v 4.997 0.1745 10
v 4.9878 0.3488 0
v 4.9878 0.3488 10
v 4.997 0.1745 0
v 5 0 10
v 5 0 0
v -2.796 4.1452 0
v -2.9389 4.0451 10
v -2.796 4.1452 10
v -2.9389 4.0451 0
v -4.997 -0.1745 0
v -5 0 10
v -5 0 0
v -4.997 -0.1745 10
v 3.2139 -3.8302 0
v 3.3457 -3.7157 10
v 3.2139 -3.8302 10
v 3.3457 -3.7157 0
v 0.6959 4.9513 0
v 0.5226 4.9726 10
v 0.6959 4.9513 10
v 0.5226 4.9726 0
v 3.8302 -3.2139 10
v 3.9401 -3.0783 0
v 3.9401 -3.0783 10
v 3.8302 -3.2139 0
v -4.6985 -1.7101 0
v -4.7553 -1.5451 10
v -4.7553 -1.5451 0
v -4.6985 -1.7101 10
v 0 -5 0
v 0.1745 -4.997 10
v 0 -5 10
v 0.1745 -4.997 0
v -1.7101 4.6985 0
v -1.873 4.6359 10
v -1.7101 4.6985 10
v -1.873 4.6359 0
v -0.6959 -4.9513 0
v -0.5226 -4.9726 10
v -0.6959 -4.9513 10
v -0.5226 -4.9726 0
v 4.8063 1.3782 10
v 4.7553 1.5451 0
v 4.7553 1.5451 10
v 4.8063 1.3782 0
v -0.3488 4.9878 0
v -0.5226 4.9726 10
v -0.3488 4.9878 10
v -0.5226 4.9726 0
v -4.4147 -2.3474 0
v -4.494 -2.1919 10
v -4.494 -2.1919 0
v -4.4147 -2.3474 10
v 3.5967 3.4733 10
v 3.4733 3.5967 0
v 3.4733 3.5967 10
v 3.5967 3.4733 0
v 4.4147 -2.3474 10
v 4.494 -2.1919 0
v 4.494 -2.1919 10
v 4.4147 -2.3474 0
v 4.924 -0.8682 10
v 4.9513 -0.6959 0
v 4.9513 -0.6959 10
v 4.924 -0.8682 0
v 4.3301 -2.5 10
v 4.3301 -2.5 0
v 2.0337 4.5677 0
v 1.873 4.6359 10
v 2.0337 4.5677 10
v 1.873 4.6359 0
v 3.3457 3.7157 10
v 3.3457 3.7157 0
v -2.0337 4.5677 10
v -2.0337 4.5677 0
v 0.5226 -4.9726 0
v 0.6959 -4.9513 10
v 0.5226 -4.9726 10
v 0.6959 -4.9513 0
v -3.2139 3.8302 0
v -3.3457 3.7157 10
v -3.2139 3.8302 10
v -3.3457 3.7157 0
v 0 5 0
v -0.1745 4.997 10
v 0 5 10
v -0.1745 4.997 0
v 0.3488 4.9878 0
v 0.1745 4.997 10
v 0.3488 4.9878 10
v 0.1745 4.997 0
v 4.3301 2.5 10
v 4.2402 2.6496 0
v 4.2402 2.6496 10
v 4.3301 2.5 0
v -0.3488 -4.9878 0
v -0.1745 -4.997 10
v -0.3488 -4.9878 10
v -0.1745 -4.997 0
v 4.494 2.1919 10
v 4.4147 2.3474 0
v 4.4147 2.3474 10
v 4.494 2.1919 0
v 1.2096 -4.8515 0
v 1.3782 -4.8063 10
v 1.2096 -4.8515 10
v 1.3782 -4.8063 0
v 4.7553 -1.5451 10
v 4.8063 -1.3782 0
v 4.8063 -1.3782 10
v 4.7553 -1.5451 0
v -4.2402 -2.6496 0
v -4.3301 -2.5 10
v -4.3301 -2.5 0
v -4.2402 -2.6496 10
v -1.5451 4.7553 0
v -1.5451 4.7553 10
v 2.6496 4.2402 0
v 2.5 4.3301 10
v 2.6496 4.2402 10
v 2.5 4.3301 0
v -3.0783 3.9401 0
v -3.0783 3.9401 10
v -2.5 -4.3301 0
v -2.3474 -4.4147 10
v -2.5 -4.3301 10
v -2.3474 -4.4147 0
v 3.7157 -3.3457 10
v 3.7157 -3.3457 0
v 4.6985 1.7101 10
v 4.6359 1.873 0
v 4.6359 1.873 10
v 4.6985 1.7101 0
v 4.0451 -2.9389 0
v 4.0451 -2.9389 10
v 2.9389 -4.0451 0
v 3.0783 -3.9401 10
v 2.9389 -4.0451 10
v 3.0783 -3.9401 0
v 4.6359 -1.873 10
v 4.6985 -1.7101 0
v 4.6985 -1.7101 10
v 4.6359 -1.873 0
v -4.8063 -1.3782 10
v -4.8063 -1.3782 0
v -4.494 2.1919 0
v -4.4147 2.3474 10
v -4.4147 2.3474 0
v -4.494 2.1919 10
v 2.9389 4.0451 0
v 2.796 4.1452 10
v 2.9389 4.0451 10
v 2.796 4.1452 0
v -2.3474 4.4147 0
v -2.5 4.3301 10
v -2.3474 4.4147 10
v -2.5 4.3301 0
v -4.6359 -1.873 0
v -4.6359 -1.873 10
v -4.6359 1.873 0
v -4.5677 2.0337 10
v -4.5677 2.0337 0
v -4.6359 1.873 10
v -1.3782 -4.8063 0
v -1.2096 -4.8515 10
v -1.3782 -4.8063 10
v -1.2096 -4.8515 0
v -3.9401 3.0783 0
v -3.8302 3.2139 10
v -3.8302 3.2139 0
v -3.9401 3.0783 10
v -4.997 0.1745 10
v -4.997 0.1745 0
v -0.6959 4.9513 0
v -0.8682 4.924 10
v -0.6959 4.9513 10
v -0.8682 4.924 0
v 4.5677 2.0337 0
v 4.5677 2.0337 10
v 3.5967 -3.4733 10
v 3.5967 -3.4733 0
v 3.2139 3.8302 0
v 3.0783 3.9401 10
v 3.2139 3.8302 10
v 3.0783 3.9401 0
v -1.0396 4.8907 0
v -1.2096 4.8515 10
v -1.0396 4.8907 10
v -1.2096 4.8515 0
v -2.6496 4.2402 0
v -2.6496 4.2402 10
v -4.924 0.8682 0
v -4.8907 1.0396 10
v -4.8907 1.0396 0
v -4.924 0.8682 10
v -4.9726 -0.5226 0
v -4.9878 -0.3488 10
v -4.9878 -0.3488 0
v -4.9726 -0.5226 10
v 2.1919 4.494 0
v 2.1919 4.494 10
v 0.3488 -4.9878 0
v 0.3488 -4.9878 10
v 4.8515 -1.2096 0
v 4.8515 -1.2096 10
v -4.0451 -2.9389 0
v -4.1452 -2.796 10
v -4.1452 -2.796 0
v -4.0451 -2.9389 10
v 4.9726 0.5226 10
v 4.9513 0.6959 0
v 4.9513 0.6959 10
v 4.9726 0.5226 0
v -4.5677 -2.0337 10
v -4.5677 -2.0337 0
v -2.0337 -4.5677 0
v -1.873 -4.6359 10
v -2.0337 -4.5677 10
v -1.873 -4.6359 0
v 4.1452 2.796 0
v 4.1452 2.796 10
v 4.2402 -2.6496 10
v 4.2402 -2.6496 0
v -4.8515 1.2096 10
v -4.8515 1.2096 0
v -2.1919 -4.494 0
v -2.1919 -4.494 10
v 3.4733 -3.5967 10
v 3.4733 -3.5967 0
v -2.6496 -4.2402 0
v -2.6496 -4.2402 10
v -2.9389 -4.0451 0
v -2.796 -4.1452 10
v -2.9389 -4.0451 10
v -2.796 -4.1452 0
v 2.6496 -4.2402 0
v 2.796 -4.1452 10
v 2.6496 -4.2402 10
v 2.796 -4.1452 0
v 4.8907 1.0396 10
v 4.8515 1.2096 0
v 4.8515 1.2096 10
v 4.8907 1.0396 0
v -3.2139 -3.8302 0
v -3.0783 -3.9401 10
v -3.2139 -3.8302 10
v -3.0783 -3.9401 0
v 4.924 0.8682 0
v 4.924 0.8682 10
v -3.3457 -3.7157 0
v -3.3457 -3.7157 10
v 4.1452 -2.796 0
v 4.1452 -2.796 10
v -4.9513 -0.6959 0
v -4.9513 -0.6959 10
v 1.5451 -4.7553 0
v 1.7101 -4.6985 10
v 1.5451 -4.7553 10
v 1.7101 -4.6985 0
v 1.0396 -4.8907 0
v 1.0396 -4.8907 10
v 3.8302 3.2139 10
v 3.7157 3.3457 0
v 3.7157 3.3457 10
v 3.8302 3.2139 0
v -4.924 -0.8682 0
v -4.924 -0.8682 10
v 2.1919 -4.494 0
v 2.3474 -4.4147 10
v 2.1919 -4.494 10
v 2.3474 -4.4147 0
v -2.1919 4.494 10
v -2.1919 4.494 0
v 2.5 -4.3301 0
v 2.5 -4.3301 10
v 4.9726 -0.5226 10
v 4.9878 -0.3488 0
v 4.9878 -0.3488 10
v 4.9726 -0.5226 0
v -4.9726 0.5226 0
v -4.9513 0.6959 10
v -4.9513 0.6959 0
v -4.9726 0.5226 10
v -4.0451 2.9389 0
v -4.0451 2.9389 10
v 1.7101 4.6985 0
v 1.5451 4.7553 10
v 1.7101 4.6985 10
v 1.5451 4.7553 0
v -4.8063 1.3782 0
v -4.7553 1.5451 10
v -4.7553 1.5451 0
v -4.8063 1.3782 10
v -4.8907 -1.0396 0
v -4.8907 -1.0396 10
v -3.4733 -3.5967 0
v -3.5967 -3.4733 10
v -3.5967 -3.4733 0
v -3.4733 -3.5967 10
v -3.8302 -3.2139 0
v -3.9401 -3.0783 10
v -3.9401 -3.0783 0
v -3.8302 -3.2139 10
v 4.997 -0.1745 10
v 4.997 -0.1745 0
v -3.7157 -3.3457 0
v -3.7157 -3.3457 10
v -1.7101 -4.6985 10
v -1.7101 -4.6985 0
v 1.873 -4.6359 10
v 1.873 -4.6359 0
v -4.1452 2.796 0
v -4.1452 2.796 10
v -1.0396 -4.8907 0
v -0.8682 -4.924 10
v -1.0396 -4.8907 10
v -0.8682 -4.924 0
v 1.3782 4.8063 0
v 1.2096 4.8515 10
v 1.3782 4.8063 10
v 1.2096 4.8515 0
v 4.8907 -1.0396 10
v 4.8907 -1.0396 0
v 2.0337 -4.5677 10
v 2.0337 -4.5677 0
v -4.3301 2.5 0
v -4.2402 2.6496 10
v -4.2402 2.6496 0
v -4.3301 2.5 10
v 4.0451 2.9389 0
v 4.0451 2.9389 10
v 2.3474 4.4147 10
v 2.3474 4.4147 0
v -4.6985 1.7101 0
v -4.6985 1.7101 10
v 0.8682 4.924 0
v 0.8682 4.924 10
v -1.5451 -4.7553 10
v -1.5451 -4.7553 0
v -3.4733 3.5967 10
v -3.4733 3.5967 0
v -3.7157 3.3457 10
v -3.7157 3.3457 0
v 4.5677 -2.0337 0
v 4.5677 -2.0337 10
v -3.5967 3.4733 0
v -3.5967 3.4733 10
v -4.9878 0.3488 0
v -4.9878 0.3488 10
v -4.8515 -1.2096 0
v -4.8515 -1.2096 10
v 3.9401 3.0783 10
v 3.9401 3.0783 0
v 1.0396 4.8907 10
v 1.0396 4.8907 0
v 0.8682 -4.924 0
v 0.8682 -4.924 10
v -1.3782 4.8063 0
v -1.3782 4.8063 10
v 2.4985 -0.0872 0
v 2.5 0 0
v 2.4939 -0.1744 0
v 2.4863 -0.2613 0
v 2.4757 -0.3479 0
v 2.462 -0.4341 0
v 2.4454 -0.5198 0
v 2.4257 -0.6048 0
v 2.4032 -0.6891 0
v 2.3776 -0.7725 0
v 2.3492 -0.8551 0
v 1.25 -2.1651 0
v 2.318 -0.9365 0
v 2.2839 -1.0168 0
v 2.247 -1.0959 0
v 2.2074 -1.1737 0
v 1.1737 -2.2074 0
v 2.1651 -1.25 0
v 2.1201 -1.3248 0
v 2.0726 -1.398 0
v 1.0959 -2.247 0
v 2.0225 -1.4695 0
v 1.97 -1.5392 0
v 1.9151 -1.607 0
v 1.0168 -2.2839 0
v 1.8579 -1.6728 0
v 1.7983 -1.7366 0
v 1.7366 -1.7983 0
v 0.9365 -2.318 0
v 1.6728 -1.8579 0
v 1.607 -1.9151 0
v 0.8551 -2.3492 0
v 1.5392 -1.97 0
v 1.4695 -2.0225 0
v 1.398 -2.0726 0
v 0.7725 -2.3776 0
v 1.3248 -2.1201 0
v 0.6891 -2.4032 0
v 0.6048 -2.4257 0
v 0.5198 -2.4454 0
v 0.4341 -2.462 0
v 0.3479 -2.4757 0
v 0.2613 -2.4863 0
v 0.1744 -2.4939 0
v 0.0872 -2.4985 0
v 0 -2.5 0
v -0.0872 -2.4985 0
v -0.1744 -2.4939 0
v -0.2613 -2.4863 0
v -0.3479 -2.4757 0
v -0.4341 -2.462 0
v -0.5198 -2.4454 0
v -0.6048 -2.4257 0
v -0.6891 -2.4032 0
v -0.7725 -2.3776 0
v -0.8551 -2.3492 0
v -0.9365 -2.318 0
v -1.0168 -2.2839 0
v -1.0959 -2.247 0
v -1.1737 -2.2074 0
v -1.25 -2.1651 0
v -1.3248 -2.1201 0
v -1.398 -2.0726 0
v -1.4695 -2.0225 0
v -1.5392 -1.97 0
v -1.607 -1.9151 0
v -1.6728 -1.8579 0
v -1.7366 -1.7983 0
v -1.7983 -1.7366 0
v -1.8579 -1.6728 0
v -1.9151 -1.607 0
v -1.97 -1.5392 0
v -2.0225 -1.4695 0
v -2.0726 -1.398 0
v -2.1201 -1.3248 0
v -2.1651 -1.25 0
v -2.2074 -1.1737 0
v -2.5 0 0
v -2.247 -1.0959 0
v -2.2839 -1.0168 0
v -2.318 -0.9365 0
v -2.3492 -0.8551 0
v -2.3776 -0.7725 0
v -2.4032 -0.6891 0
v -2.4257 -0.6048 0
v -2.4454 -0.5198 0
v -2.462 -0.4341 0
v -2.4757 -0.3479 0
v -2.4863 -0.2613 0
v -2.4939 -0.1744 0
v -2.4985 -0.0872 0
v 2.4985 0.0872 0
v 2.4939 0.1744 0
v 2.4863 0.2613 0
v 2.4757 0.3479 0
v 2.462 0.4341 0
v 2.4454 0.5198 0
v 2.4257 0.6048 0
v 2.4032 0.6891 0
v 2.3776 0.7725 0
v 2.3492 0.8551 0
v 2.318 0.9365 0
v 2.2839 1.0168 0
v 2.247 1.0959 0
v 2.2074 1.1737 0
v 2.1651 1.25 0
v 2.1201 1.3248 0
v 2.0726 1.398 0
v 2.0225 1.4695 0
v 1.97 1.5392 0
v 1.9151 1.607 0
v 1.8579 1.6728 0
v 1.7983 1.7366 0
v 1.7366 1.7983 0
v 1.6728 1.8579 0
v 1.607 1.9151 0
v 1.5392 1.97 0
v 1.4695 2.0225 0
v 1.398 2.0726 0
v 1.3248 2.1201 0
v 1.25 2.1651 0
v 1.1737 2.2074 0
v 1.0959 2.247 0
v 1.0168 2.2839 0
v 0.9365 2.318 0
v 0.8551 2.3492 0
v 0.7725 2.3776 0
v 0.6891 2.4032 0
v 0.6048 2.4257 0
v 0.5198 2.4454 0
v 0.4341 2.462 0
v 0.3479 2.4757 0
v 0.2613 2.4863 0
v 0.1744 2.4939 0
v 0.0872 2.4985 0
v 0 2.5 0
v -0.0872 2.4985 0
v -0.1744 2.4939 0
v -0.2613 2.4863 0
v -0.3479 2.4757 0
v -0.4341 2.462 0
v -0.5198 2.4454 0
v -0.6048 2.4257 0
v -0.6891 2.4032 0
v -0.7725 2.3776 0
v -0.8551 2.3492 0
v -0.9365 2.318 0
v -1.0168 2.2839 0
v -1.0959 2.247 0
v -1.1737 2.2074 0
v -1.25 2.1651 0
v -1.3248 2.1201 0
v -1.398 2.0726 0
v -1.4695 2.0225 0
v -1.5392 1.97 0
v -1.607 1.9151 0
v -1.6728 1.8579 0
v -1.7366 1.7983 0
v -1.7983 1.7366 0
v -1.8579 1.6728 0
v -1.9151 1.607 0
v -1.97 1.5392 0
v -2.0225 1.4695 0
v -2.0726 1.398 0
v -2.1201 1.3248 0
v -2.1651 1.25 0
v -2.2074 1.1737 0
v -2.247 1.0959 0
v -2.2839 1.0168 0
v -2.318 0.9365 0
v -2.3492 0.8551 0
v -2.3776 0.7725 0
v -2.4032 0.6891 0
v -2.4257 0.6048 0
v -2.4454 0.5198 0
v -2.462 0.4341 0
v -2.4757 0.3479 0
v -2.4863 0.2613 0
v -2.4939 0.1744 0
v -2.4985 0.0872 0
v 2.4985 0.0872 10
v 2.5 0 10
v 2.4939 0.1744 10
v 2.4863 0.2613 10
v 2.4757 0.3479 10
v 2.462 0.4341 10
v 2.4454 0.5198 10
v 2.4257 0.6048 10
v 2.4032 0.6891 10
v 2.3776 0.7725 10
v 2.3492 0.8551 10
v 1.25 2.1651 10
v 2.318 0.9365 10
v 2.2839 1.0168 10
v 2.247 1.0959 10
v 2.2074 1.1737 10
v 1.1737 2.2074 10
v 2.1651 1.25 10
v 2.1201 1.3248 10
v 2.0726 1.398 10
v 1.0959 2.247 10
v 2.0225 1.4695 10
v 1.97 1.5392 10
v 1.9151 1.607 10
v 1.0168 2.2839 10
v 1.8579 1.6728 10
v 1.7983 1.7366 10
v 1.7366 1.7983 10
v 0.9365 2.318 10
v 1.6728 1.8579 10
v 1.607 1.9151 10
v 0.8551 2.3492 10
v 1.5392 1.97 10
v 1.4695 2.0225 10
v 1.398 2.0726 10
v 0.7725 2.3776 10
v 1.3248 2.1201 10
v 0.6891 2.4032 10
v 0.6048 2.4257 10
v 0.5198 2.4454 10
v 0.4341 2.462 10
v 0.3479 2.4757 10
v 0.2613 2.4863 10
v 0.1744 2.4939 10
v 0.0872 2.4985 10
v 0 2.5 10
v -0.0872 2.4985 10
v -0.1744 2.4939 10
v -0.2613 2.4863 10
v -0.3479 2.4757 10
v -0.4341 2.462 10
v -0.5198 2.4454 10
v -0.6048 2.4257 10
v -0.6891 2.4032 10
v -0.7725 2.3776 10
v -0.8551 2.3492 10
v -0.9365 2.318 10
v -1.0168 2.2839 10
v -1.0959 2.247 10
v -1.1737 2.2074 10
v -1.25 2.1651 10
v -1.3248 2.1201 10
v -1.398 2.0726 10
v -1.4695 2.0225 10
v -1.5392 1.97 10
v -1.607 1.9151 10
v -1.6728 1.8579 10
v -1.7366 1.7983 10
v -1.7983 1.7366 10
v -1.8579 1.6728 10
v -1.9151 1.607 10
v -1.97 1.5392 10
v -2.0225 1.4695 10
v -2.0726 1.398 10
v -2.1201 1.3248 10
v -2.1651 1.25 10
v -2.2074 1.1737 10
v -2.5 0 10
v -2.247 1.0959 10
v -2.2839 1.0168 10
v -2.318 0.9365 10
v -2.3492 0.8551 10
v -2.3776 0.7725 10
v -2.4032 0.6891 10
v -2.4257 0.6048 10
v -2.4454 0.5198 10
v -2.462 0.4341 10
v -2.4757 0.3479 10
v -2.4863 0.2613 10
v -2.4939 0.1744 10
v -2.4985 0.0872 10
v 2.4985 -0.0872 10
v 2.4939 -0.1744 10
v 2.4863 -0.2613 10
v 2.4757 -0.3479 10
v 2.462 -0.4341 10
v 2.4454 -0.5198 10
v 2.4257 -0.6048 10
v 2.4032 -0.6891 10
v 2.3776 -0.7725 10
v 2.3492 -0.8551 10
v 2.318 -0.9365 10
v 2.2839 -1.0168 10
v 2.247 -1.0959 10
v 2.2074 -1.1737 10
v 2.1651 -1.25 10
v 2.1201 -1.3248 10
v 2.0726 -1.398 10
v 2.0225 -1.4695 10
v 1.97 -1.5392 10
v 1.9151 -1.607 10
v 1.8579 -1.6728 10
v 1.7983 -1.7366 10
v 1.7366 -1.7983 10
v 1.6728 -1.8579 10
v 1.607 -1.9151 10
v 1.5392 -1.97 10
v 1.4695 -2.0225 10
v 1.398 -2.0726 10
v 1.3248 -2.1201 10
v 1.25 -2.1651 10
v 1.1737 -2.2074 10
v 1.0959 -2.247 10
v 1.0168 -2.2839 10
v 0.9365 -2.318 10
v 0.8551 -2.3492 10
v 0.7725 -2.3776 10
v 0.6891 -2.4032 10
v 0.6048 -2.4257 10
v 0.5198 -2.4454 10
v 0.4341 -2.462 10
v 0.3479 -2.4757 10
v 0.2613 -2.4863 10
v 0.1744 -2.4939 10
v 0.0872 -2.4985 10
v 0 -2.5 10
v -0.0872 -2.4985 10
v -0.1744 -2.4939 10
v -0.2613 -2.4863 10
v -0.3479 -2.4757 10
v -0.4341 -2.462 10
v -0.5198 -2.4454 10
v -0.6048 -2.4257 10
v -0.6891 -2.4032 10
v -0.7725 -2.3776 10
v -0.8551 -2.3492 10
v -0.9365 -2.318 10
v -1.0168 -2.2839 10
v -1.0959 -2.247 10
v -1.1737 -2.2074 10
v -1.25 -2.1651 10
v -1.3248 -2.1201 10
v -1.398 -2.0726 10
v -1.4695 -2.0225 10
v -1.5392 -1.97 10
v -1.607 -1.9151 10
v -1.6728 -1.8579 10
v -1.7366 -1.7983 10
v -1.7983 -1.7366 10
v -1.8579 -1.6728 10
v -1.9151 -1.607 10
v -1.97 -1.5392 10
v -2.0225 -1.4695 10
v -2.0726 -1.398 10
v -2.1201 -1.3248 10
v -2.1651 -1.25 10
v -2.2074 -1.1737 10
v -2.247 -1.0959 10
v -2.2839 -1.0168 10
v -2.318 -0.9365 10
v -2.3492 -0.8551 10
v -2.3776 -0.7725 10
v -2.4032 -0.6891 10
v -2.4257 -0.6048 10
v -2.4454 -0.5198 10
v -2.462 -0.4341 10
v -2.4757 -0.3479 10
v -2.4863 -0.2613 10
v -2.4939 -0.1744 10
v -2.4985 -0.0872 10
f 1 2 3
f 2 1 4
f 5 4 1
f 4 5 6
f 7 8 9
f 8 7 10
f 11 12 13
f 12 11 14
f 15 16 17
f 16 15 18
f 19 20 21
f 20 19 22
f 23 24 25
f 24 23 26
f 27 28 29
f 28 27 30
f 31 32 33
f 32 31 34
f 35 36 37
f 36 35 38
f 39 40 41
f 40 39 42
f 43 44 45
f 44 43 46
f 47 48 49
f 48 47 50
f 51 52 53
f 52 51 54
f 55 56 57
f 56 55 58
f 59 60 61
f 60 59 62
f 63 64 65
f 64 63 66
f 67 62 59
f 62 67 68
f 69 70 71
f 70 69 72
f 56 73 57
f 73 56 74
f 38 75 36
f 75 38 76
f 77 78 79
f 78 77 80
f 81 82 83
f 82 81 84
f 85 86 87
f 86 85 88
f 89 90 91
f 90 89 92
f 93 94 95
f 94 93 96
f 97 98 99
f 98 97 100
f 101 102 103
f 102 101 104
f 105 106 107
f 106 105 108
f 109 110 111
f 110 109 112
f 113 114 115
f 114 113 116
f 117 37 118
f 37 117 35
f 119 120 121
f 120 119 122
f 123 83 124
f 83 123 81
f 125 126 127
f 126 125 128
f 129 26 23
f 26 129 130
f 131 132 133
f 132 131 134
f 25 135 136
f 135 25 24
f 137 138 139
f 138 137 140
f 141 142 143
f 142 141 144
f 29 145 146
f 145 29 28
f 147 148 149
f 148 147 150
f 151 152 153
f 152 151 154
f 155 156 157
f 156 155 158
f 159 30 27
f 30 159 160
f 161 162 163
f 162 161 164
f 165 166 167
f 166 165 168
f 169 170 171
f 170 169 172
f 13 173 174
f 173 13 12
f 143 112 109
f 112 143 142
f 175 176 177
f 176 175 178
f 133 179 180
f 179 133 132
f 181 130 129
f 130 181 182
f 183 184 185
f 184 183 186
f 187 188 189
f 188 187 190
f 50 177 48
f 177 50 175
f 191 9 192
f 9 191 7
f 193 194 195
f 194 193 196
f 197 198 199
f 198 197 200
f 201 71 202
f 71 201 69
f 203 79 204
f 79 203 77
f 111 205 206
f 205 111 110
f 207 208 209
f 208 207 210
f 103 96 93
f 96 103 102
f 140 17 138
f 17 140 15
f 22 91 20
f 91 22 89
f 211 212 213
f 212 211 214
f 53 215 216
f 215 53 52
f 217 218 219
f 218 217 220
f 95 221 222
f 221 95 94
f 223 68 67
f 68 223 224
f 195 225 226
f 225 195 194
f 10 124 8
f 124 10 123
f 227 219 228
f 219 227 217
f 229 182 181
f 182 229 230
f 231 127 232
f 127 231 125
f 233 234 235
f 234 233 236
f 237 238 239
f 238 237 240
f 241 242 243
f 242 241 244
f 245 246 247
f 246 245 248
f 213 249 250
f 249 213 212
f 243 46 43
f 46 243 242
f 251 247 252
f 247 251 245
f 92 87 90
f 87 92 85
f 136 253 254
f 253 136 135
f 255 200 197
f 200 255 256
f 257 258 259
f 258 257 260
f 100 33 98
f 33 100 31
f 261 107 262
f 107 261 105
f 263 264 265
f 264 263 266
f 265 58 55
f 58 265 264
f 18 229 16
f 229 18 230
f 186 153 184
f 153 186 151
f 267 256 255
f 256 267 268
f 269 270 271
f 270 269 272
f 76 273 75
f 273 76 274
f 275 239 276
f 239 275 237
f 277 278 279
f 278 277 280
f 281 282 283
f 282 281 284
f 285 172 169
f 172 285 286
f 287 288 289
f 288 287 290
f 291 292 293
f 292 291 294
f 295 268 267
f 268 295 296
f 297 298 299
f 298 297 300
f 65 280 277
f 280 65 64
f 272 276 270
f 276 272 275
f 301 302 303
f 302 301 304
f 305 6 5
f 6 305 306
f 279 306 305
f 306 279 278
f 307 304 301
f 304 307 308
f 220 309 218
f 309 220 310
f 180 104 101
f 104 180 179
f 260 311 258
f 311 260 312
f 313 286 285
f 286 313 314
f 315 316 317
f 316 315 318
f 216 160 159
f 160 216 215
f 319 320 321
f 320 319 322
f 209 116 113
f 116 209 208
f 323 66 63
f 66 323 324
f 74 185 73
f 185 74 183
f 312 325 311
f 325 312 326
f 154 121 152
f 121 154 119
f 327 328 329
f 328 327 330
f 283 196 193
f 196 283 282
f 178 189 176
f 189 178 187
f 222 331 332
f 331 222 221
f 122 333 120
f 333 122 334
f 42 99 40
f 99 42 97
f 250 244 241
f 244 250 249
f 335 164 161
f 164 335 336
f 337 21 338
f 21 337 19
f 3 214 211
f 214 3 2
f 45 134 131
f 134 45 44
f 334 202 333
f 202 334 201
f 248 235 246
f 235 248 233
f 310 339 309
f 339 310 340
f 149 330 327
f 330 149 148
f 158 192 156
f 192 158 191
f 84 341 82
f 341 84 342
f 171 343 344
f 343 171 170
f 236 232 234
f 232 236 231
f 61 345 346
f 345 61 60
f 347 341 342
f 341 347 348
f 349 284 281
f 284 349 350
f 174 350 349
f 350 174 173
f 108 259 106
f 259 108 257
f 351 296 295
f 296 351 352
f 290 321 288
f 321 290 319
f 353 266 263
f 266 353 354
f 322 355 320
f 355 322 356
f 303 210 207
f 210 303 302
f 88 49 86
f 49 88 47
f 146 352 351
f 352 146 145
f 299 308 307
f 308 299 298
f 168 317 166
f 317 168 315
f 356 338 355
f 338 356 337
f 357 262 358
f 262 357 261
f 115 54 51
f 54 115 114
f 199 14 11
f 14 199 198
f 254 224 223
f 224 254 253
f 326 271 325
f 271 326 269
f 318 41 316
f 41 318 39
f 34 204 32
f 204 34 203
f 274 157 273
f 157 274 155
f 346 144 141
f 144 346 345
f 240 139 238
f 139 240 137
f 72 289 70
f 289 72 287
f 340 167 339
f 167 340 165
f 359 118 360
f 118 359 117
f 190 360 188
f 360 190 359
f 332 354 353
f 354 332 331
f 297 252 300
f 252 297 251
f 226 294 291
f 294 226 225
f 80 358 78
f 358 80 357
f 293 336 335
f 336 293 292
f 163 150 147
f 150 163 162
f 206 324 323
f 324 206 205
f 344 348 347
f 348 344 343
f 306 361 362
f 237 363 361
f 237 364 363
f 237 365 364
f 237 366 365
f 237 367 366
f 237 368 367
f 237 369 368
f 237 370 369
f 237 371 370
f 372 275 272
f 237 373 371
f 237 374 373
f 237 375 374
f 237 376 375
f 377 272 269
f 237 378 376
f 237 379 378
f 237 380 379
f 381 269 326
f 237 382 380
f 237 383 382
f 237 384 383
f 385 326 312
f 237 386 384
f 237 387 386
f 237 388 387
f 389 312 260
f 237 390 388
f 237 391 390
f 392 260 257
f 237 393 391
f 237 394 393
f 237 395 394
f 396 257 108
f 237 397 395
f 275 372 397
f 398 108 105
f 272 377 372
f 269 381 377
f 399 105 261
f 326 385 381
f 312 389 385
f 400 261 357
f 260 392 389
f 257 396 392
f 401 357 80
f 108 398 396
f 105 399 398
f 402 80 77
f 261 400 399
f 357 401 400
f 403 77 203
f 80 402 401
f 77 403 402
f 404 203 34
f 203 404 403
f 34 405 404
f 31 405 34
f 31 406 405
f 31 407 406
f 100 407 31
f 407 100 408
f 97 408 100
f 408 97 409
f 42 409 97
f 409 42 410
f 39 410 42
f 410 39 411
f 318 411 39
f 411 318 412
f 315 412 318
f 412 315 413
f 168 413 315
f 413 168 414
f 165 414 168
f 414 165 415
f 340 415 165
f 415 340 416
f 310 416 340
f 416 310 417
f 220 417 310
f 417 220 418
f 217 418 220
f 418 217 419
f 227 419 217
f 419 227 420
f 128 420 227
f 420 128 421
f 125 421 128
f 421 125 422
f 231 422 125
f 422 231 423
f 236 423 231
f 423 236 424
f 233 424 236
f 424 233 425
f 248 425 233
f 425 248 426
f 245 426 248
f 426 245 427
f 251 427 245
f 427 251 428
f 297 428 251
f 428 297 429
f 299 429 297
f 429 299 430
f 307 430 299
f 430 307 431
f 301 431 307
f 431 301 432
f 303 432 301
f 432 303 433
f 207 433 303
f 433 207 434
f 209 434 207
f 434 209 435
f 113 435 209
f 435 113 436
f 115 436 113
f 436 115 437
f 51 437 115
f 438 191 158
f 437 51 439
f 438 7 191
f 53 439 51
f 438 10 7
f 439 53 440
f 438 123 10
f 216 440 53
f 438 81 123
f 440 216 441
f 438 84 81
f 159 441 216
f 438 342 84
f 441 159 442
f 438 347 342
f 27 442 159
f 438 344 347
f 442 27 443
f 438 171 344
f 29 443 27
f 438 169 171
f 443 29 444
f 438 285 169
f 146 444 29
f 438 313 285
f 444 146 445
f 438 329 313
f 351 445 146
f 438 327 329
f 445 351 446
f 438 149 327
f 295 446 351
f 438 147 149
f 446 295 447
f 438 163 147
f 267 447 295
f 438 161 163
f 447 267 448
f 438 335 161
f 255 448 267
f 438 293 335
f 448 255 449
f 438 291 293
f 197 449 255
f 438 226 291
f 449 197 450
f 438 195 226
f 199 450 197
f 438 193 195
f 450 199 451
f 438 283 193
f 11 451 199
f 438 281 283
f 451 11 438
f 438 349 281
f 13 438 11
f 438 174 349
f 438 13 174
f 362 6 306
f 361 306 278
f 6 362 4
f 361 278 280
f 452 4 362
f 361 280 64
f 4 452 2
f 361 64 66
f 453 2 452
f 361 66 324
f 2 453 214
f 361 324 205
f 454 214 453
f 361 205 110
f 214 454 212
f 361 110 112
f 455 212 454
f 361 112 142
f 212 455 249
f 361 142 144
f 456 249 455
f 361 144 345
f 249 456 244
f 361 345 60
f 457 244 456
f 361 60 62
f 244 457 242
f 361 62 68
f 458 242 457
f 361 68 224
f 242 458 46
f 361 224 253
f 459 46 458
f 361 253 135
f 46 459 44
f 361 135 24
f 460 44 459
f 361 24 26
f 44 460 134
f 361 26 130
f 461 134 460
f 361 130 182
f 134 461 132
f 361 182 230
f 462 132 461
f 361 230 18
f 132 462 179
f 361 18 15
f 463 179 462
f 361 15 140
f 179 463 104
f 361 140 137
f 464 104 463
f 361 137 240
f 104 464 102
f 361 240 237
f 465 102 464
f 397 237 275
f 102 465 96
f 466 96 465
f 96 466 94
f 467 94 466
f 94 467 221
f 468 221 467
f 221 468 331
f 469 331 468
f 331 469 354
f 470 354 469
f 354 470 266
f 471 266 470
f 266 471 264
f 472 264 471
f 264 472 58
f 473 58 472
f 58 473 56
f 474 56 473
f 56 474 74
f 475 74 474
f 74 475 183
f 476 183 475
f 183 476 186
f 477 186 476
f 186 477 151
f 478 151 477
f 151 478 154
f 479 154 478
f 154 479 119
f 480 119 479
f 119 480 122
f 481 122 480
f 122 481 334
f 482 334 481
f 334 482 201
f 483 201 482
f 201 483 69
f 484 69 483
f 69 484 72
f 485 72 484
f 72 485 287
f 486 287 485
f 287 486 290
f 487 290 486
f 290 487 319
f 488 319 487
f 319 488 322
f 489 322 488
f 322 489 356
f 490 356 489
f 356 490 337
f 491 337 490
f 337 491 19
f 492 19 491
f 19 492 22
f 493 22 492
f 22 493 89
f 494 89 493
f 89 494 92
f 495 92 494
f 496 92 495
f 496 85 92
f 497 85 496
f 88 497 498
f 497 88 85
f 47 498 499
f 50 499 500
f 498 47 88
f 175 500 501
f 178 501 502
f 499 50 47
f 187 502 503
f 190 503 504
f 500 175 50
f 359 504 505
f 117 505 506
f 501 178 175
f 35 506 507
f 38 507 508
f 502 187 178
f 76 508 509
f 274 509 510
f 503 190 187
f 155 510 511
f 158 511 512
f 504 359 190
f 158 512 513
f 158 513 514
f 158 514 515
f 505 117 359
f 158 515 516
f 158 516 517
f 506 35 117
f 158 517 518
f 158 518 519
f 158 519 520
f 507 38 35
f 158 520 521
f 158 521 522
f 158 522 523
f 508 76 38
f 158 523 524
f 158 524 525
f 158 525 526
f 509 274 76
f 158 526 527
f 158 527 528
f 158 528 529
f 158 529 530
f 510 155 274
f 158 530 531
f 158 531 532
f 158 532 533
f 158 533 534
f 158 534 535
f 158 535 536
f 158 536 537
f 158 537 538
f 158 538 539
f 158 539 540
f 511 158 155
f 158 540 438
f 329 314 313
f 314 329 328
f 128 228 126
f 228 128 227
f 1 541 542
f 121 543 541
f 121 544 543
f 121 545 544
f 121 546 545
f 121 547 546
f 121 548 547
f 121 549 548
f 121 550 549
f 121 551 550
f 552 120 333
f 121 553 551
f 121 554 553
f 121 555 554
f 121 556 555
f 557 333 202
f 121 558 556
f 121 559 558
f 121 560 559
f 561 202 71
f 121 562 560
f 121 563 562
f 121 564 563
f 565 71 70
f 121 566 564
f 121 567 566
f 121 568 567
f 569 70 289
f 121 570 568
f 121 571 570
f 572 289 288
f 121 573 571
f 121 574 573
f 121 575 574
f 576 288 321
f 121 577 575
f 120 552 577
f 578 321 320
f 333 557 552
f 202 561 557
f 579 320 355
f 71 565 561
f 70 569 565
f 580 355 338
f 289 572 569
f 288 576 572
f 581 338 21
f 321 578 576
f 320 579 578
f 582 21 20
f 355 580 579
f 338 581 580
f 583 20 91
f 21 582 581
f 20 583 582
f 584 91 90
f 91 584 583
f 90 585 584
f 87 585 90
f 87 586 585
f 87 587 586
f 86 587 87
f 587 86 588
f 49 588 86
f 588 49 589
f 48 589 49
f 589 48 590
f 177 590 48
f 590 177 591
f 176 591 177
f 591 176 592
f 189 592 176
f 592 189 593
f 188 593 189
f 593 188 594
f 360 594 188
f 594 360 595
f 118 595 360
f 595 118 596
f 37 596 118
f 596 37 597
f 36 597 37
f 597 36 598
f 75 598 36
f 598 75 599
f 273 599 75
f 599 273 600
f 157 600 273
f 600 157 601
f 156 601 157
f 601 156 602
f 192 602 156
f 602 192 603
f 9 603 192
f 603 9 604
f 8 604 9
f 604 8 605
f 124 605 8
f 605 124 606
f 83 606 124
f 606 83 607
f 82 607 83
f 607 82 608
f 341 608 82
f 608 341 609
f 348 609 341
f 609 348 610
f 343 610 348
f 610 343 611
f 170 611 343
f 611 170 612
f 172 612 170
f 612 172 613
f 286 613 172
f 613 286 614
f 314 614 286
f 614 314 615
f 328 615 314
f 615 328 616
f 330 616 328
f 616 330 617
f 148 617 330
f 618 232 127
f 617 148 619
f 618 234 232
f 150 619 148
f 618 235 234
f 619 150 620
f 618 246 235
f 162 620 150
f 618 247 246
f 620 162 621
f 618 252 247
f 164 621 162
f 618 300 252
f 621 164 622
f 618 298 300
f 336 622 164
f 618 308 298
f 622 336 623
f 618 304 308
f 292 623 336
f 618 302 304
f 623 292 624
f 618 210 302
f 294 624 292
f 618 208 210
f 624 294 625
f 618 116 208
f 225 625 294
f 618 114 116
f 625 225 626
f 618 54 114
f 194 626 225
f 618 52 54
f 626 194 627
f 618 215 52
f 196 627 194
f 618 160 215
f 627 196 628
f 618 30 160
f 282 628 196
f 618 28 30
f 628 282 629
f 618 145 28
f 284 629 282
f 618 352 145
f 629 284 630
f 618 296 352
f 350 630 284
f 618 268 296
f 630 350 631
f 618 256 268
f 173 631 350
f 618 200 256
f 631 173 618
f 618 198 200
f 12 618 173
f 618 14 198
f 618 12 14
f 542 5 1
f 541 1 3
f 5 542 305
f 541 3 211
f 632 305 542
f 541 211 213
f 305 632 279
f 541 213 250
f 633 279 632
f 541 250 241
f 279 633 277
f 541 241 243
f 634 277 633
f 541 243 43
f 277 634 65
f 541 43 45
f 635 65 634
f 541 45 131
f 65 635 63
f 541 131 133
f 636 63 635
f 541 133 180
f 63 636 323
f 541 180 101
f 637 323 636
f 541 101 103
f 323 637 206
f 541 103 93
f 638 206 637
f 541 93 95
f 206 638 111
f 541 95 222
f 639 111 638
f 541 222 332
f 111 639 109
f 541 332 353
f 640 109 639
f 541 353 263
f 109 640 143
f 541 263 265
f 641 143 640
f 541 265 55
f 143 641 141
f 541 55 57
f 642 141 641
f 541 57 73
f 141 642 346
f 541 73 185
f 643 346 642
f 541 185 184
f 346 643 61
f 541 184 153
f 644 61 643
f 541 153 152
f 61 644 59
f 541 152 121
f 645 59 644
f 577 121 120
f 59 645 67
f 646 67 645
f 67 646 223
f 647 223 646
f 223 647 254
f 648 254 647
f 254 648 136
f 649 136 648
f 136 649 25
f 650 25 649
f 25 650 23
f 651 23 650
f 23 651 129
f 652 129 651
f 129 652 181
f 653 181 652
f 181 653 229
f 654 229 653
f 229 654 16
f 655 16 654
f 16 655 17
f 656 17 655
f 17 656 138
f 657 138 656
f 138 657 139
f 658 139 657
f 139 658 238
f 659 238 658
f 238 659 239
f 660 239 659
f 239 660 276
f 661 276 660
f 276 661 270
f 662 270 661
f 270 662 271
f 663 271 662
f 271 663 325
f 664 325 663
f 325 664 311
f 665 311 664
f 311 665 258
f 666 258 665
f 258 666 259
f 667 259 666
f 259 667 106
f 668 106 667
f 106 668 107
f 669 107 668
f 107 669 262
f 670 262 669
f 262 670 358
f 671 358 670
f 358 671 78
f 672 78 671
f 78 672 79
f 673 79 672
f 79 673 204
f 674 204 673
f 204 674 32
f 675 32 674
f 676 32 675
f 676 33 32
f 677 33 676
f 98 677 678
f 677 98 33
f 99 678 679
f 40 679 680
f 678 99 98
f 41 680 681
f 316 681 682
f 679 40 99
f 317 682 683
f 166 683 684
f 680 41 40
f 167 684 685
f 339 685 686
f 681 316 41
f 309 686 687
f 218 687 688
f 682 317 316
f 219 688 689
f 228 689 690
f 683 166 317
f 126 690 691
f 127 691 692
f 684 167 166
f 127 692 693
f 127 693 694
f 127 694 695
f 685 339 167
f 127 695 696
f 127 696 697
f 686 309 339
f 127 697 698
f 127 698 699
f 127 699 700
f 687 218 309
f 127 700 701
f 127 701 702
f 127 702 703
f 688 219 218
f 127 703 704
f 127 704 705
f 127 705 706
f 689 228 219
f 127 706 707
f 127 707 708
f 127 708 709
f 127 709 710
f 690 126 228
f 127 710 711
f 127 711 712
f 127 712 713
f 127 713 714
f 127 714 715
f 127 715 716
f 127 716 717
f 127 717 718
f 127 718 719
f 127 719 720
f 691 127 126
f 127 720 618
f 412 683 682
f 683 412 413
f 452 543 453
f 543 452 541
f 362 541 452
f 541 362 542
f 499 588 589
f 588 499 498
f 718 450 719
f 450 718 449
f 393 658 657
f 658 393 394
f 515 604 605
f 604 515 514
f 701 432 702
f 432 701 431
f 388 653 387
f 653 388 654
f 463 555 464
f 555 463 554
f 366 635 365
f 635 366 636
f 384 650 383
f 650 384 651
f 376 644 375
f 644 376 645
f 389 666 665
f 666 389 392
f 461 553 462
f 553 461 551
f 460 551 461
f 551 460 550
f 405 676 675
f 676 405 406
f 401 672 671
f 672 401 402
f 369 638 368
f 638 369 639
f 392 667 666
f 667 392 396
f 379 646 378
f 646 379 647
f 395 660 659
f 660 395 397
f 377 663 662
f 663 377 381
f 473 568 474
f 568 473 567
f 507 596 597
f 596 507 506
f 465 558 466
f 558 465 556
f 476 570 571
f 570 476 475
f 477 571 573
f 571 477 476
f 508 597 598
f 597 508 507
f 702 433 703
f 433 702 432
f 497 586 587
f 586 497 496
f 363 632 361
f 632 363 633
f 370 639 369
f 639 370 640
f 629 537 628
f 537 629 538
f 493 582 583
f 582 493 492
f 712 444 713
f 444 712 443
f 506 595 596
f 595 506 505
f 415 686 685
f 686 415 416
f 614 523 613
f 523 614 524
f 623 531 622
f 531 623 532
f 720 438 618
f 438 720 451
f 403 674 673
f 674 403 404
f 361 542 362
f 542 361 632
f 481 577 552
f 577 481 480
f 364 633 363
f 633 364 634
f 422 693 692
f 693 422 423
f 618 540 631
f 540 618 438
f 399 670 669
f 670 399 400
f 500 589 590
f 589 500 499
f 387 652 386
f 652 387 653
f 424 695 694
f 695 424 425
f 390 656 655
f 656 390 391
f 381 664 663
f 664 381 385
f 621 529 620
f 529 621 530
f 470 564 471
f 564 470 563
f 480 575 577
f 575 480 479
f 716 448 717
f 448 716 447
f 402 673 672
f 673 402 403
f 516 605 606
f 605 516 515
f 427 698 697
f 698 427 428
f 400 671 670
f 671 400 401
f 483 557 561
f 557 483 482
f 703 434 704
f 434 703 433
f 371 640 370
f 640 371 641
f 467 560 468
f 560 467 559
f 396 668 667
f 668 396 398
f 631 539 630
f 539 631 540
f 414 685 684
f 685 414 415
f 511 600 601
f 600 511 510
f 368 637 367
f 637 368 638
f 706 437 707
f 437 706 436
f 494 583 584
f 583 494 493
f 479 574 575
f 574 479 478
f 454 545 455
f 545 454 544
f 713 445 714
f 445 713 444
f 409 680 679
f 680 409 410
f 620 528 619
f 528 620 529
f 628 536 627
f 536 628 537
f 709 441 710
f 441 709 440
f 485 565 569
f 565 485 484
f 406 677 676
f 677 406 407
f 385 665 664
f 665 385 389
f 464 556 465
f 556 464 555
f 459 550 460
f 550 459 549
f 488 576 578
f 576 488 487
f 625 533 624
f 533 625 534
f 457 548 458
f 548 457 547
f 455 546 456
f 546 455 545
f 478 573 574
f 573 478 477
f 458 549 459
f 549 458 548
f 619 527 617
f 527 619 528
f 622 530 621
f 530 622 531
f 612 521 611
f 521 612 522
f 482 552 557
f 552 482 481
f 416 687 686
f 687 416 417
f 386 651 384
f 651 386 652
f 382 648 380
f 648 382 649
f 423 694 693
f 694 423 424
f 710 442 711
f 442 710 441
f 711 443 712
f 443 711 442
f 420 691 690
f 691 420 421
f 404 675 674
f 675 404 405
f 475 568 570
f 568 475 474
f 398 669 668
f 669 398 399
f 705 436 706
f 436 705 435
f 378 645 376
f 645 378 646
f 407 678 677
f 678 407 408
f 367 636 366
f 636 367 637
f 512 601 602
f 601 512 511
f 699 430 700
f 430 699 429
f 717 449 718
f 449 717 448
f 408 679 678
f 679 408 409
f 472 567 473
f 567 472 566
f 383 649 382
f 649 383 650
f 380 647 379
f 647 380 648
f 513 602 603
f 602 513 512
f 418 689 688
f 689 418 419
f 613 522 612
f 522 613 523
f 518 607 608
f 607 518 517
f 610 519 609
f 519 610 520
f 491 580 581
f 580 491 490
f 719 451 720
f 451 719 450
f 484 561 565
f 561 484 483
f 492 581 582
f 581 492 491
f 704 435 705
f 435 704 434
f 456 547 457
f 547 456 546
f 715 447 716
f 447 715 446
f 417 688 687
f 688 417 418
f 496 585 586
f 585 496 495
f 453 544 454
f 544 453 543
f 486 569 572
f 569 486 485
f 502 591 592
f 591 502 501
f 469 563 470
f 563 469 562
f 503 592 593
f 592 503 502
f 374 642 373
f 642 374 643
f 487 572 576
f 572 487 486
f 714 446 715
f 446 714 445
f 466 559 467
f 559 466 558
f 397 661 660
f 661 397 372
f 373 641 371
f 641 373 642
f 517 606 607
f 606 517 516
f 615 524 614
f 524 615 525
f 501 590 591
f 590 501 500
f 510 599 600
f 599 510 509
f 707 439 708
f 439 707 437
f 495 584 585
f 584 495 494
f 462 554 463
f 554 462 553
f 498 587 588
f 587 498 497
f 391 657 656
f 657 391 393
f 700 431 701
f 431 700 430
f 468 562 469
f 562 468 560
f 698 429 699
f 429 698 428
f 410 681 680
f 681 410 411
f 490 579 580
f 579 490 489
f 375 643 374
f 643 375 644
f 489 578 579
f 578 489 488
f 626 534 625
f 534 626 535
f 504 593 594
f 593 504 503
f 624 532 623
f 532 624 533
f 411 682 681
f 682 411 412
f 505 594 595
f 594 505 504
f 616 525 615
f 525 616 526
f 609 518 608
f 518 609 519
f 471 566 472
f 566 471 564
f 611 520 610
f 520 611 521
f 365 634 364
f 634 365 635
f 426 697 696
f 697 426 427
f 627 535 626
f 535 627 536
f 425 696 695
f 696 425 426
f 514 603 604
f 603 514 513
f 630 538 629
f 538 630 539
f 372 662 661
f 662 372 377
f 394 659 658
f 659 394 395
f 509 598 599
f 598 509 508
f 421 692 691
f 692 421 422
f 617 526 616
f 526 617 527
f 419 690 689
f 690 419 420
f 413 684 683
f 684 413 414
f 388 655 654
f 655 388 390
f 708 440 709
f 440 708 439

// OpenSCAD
/*************************************************
 * Tube (VET)
 * Author: Robert L. Miller
 * Date: 2017-01-22
 * Revision: 001A
 * Provides: Tube
 * Parameter: height - the height/length of tube
 * Parameter: id - the inner diameter
 * Parameter: od - the outer diameter
 ************************************************/
 
 module Tube( height, id, od, center = false ) {
     difference() {
         cylinder( h = height, d = od, center = center );
         translate( [0, 0, -0.001] ) {
             cylinder( h = height + 0.002, d = id, center = center );
         }
     }
 }
 
$fn = 180;
 
 Tube( height = 10, id = 5, od = 10 );
